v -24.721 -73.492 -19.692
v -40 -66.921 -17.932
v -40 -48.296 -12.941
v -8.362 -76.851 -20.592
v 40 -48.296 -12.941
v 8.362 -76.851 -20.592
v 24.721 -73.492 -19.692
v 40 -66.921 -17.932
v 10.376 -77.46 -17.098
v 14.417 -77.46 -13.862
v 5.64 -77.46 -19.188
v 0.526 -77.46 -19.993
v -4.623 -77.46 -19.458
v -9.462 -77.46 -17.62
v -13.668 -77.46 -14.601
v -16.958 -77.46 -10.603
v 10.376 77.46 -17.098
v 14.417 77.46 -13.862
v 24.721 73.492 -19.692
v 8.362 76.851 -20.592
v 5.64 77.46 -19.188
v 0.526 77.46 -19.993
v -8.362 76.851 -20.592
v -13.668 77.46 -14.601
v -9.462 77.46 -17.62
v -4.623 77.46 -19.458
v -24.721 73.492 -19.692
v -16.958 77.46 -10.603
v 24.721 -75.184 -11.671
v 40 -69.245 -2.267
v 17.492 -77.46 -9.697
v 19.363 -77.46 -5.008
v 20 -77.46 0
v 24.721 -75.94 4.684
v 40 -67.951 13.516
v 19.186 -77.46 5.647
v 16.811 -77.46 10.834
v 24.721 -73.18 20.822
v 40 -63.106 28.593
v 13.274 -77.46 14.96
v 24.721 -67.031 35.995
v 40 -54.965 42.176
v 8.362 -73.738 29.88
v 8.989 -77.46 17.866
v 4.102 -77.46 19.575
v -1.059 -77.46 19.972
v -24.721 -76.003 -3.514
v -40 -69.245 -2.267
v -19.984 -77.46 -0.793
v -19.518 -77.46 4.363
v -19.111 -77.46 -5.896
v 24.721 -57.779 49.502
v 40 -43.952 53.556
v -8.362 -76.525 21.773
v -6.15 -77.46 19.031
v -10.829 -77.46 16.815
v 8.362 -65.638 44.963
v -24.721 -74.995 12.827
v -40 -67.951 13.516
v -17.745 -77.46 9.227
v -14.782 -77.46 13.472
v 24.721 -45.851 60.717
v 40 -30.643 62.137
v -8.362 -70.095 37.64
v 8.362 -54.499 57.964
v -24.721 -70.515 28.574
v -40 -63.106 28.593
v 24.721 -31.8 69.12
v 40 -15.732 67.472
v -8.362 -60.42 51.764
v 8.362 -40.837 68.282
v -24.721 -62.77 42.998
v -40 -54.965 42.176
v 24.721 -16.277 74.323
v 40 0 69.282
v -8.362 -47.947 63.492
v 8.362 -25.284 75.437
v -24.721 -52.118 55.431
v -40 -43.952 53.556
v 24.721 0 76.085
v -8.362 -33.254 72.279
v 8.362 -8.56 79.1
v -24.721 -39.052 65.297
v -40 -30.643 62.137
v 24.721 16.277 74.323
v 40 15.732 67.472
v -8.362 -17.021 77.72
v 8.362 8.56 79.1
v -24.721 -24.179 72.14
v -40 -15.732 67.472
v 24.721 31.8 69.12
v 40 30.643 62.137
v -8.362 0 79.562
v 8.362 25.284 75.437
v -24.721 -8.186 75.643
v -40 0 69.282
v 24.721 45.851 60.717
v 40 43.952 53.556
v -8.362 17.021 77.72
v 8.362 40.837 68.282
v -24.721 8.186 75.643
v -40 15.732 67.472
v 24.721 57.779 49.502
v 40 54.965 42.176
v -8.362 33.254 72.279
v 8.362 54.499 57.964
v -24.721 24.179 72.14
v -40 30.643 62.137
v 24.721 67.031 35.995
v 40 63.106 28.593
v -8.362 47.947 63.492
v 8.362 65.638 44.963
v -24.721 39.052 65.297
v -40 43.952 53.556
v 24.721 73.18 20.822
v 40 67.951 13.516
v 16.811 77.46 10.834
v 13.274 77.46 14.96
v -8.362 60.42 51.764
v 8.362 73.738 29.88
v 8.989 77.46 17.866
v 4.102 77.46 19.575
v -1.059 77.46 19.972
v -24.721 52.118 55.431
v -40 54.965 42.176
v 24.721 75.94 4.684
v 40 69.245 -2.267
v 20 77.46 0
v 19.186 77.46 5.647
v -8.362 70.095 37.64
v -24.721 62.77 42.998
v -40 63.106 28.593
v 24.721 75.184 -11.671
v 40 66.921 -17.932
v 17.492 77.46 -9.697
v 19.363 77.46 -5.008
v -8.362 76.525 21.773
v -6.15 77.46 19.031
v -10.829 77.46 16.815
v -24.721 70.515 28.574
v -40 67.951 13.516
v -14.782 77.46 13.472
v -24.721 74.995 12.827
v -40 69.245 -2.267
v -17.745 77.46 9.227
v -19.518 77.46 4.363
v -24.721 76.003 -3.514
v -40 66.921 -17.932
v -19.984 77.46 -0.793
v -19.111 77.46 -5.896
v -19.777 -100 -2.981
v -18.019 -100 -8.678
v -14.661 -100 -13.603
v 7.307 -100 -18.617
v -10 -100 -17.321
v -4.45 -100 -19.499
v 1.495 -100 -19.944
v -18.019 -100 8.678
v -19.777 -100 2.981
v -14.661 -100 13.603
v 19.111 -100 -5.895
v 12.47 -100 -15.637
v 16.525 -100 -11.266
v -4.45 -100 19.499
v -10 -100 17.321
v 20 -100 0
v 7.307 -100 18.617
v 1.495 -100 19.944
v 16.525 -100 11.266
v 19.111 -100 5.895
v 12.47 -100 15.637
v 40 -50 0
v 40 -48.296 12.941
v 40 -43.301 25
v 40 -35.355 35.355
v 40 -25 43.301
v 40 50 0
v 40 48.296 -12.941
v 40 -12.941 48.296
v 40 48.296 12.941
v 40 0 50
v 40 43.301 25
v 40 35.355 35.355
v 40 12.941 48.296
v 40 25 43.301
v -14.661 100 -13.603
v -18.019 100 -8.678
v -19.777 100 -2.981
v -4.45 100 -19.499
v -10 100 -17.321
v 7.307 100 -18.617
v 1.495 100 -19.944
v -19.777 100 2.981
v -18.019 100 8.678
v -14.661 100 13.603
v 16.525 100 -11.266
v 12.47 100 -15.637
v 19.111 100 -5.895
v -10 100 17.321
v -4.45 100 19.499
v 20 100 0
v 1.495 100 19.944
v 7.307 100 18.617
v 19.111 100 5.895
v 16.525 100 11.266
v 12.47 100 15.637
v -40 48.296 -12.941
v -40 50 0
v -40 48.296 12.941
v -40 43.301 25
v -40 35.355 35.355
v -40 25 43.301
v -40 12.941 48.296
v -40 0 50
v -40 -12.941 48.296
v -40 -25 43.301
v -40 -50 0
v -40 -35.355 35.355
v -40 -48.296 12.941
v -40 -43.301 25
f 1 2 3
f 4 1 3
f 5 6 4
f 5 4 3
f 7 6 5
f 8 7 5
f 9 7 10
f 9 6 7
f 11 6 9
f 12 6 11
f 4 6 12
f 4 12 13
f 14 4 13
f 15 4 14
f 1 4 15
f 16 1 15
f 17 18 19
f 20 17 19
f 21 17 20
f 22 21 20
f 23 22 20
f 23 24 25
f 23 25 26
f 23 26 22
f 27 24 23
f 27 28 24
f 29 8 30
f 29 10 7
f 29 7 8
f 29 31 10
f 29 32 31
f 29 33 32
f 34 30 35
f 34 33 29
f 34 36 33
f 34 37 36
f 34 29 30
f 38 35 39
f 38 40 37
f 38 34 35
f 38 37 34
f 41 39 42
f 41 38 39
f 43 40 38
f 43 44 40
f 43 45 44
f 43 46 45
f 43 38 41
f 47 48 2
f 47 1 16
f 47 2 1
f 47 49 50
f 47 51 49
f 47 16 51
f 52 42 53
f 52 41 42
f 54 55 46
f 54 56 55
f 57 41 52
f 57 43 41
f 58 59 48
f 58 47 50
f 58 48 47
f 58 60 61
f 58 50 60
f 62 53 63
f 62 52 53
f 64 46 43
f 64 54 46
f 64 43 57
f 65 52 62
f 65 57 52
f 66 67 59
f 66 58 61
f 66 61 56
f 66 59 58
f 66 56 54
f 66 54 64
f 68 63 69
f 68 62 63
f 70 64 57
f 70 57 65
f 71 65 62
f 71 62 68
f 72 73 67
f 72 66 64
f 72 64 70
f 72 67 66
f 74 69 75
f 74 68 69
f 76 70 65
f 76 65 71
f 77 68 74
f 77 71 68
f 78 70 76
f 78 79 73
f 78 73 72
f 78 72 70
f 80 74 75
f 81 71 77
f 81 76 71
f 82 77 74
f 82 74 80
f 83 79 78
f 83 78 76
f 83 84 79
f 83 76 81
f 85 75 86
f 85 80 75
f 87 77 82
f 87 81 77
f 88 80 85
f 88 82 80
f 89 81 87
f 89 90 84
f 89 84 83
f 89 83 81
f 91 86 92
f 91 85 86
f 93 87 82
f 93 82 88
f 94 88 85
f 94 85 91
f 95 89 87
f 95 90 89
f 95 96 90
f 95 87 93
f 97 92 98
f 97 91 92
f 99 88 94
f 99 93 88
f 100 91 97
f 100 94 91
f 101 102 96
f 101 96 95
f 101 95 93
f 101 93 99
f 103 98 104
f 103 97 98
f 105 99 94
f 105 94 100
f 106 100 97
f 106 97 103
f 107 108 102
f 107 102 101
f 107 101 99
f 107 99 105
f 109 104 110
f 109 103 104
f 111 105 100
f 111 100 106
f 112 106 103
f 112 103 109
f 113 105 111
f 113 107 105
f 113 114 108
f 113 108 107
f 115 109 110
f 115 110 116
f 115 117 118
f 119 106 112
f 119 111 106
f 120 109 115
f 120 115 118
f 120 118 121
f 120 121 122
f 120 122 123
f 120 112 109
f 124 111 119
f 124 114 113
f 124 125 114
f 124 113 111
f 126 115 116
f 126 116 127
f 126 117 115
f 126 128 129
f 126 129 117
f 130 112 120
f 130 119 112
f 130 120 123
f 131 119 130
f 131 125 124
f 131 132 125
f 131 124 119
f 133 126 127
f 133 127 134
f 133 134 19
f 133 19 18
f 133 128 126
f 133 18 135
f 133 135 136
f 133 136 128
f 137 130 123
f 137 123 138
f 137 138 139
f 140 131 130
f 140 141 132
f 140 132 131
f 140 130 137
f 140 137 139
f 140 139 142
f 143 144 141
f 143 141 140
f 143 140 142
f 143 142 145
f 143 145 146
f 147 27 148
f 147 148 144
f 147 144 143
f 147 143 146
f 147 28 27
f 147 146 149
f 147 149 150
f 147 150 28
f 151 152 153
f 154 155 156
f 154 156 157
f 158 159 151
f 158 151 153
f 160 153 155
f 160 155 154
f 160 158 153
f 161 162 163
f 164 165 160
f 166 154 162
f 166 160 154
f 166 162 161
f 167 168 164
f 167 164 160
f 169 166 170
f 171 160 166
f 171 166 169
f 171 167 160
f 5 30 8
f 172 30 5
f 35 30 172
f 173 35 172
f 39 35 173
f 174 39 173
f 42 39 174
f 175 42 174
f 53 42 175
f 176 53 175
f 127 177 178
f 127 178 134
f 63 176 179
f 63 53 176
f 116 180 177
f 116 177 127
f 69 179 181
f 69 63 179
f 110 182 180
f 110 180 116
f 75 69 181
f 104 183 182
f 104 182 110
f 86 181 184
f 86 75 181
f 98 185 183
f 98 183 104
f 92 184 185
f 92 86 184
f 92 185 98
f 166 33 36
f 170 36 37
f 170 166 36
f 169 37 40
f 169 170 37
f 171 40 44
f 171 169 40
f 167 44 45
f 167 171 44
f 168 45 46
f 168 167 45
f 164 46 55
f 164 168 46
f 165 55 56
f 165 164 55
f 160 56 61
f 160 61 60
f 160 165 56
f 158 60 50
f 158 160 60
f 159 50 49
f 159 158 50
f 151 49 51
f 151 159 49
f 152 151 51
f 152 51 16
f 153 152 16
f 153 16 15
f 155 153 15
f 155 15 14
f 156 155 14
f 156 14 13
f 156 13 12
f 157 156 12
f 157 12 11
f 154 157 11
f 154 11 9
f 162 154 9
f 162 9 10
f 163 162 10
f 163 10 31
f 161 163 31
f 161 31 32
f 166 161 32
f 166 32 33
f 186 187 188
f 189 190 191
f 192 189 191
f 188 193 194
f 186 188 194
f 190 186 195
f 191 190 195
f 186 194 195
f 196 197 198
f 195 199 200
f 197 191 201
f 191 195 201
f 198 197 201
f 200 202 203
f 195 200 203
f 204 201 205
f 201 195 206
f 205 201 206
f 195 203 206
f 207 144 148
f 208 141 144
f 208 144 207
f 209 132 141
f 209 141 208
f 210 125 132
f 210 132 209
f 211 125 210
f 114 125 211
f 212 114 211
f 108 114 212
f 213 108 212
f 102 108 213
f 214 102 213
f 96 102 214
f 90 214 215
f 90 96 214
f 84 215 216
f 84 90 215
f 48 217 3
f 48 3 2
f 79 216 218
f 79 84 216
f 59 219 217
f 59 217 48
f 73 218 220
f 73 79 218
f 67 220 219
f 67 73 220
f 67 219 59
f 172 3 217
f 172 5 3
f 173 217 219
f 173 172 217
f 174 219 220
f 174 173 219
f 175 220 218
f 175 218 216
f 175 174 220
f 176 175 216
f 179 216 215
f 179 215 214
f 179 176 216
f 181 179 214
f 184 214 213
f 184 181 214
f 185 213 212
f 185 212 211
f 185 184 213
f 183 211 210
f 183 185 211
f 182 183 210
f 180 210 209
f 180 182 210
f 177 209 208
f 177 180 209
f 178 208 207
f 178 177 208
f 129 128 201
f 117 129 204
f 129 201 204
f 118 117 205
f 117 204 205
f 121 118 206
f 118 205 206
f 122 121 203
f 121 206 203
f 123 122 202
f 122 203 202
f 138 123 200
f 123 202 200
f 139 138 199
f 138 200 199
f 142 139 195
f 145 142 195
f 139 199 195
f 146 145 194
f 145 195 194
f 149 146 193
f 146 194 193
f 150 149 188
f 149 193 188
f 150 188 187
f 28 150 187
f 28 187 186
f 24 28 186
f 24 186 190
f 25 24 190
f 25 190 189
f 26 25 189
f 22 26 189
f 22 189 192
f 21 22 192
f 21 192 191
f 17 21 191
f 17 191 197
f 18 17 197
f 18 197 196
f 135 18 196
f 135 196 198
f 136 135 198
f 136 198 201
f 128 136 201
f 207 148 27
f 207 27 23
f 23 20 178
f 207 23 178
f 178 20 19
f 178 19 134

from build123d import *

# Parameters (mm, degrees)
F1_ANGLE_BACK = 105
F1_ANGLE      = 210
F3_R          = 20


with BuildPart() as f1:
    # F0 (on Front) → F1 (revolve)
    with BuildSketch(Plane.XZ, mode=Mode.PRIVATE) as f1_sk:
        with BuildLine():
            ThreePointArc((40, 69.2820323028), (0, 80), (-40, 69.2820323028))
            Line((-40, 69.2820323028), (-40, 50))
            Line((-40, 50), (40, 50))
            Line((40, 50), (40, 69.2820323028))
        make_face()
    revolve(f1_sk.sketch.rotate(Axis((-190.0887642899, 0, 0), (-1, 0, 0)), -F1_ANGLE_BACK), axis=Axis((-190.0887642899, 0, 0), (-1, 0, 0)), revolution_arc=F1_ANGLE)

    # F3 (on offset) → F4 (join, up to the next surface of F1)
    with BuildSketch(Plane.XZ.offset(-100)):
        Circle(F3_R)
    extrude(until=Until.NEXT)

    # F5: F1 across plane


with BuildPart() as f1_1:
    add(f1.part)
    add(f1.part.mirror(Plane.XZ))


solid = f1_1.part
